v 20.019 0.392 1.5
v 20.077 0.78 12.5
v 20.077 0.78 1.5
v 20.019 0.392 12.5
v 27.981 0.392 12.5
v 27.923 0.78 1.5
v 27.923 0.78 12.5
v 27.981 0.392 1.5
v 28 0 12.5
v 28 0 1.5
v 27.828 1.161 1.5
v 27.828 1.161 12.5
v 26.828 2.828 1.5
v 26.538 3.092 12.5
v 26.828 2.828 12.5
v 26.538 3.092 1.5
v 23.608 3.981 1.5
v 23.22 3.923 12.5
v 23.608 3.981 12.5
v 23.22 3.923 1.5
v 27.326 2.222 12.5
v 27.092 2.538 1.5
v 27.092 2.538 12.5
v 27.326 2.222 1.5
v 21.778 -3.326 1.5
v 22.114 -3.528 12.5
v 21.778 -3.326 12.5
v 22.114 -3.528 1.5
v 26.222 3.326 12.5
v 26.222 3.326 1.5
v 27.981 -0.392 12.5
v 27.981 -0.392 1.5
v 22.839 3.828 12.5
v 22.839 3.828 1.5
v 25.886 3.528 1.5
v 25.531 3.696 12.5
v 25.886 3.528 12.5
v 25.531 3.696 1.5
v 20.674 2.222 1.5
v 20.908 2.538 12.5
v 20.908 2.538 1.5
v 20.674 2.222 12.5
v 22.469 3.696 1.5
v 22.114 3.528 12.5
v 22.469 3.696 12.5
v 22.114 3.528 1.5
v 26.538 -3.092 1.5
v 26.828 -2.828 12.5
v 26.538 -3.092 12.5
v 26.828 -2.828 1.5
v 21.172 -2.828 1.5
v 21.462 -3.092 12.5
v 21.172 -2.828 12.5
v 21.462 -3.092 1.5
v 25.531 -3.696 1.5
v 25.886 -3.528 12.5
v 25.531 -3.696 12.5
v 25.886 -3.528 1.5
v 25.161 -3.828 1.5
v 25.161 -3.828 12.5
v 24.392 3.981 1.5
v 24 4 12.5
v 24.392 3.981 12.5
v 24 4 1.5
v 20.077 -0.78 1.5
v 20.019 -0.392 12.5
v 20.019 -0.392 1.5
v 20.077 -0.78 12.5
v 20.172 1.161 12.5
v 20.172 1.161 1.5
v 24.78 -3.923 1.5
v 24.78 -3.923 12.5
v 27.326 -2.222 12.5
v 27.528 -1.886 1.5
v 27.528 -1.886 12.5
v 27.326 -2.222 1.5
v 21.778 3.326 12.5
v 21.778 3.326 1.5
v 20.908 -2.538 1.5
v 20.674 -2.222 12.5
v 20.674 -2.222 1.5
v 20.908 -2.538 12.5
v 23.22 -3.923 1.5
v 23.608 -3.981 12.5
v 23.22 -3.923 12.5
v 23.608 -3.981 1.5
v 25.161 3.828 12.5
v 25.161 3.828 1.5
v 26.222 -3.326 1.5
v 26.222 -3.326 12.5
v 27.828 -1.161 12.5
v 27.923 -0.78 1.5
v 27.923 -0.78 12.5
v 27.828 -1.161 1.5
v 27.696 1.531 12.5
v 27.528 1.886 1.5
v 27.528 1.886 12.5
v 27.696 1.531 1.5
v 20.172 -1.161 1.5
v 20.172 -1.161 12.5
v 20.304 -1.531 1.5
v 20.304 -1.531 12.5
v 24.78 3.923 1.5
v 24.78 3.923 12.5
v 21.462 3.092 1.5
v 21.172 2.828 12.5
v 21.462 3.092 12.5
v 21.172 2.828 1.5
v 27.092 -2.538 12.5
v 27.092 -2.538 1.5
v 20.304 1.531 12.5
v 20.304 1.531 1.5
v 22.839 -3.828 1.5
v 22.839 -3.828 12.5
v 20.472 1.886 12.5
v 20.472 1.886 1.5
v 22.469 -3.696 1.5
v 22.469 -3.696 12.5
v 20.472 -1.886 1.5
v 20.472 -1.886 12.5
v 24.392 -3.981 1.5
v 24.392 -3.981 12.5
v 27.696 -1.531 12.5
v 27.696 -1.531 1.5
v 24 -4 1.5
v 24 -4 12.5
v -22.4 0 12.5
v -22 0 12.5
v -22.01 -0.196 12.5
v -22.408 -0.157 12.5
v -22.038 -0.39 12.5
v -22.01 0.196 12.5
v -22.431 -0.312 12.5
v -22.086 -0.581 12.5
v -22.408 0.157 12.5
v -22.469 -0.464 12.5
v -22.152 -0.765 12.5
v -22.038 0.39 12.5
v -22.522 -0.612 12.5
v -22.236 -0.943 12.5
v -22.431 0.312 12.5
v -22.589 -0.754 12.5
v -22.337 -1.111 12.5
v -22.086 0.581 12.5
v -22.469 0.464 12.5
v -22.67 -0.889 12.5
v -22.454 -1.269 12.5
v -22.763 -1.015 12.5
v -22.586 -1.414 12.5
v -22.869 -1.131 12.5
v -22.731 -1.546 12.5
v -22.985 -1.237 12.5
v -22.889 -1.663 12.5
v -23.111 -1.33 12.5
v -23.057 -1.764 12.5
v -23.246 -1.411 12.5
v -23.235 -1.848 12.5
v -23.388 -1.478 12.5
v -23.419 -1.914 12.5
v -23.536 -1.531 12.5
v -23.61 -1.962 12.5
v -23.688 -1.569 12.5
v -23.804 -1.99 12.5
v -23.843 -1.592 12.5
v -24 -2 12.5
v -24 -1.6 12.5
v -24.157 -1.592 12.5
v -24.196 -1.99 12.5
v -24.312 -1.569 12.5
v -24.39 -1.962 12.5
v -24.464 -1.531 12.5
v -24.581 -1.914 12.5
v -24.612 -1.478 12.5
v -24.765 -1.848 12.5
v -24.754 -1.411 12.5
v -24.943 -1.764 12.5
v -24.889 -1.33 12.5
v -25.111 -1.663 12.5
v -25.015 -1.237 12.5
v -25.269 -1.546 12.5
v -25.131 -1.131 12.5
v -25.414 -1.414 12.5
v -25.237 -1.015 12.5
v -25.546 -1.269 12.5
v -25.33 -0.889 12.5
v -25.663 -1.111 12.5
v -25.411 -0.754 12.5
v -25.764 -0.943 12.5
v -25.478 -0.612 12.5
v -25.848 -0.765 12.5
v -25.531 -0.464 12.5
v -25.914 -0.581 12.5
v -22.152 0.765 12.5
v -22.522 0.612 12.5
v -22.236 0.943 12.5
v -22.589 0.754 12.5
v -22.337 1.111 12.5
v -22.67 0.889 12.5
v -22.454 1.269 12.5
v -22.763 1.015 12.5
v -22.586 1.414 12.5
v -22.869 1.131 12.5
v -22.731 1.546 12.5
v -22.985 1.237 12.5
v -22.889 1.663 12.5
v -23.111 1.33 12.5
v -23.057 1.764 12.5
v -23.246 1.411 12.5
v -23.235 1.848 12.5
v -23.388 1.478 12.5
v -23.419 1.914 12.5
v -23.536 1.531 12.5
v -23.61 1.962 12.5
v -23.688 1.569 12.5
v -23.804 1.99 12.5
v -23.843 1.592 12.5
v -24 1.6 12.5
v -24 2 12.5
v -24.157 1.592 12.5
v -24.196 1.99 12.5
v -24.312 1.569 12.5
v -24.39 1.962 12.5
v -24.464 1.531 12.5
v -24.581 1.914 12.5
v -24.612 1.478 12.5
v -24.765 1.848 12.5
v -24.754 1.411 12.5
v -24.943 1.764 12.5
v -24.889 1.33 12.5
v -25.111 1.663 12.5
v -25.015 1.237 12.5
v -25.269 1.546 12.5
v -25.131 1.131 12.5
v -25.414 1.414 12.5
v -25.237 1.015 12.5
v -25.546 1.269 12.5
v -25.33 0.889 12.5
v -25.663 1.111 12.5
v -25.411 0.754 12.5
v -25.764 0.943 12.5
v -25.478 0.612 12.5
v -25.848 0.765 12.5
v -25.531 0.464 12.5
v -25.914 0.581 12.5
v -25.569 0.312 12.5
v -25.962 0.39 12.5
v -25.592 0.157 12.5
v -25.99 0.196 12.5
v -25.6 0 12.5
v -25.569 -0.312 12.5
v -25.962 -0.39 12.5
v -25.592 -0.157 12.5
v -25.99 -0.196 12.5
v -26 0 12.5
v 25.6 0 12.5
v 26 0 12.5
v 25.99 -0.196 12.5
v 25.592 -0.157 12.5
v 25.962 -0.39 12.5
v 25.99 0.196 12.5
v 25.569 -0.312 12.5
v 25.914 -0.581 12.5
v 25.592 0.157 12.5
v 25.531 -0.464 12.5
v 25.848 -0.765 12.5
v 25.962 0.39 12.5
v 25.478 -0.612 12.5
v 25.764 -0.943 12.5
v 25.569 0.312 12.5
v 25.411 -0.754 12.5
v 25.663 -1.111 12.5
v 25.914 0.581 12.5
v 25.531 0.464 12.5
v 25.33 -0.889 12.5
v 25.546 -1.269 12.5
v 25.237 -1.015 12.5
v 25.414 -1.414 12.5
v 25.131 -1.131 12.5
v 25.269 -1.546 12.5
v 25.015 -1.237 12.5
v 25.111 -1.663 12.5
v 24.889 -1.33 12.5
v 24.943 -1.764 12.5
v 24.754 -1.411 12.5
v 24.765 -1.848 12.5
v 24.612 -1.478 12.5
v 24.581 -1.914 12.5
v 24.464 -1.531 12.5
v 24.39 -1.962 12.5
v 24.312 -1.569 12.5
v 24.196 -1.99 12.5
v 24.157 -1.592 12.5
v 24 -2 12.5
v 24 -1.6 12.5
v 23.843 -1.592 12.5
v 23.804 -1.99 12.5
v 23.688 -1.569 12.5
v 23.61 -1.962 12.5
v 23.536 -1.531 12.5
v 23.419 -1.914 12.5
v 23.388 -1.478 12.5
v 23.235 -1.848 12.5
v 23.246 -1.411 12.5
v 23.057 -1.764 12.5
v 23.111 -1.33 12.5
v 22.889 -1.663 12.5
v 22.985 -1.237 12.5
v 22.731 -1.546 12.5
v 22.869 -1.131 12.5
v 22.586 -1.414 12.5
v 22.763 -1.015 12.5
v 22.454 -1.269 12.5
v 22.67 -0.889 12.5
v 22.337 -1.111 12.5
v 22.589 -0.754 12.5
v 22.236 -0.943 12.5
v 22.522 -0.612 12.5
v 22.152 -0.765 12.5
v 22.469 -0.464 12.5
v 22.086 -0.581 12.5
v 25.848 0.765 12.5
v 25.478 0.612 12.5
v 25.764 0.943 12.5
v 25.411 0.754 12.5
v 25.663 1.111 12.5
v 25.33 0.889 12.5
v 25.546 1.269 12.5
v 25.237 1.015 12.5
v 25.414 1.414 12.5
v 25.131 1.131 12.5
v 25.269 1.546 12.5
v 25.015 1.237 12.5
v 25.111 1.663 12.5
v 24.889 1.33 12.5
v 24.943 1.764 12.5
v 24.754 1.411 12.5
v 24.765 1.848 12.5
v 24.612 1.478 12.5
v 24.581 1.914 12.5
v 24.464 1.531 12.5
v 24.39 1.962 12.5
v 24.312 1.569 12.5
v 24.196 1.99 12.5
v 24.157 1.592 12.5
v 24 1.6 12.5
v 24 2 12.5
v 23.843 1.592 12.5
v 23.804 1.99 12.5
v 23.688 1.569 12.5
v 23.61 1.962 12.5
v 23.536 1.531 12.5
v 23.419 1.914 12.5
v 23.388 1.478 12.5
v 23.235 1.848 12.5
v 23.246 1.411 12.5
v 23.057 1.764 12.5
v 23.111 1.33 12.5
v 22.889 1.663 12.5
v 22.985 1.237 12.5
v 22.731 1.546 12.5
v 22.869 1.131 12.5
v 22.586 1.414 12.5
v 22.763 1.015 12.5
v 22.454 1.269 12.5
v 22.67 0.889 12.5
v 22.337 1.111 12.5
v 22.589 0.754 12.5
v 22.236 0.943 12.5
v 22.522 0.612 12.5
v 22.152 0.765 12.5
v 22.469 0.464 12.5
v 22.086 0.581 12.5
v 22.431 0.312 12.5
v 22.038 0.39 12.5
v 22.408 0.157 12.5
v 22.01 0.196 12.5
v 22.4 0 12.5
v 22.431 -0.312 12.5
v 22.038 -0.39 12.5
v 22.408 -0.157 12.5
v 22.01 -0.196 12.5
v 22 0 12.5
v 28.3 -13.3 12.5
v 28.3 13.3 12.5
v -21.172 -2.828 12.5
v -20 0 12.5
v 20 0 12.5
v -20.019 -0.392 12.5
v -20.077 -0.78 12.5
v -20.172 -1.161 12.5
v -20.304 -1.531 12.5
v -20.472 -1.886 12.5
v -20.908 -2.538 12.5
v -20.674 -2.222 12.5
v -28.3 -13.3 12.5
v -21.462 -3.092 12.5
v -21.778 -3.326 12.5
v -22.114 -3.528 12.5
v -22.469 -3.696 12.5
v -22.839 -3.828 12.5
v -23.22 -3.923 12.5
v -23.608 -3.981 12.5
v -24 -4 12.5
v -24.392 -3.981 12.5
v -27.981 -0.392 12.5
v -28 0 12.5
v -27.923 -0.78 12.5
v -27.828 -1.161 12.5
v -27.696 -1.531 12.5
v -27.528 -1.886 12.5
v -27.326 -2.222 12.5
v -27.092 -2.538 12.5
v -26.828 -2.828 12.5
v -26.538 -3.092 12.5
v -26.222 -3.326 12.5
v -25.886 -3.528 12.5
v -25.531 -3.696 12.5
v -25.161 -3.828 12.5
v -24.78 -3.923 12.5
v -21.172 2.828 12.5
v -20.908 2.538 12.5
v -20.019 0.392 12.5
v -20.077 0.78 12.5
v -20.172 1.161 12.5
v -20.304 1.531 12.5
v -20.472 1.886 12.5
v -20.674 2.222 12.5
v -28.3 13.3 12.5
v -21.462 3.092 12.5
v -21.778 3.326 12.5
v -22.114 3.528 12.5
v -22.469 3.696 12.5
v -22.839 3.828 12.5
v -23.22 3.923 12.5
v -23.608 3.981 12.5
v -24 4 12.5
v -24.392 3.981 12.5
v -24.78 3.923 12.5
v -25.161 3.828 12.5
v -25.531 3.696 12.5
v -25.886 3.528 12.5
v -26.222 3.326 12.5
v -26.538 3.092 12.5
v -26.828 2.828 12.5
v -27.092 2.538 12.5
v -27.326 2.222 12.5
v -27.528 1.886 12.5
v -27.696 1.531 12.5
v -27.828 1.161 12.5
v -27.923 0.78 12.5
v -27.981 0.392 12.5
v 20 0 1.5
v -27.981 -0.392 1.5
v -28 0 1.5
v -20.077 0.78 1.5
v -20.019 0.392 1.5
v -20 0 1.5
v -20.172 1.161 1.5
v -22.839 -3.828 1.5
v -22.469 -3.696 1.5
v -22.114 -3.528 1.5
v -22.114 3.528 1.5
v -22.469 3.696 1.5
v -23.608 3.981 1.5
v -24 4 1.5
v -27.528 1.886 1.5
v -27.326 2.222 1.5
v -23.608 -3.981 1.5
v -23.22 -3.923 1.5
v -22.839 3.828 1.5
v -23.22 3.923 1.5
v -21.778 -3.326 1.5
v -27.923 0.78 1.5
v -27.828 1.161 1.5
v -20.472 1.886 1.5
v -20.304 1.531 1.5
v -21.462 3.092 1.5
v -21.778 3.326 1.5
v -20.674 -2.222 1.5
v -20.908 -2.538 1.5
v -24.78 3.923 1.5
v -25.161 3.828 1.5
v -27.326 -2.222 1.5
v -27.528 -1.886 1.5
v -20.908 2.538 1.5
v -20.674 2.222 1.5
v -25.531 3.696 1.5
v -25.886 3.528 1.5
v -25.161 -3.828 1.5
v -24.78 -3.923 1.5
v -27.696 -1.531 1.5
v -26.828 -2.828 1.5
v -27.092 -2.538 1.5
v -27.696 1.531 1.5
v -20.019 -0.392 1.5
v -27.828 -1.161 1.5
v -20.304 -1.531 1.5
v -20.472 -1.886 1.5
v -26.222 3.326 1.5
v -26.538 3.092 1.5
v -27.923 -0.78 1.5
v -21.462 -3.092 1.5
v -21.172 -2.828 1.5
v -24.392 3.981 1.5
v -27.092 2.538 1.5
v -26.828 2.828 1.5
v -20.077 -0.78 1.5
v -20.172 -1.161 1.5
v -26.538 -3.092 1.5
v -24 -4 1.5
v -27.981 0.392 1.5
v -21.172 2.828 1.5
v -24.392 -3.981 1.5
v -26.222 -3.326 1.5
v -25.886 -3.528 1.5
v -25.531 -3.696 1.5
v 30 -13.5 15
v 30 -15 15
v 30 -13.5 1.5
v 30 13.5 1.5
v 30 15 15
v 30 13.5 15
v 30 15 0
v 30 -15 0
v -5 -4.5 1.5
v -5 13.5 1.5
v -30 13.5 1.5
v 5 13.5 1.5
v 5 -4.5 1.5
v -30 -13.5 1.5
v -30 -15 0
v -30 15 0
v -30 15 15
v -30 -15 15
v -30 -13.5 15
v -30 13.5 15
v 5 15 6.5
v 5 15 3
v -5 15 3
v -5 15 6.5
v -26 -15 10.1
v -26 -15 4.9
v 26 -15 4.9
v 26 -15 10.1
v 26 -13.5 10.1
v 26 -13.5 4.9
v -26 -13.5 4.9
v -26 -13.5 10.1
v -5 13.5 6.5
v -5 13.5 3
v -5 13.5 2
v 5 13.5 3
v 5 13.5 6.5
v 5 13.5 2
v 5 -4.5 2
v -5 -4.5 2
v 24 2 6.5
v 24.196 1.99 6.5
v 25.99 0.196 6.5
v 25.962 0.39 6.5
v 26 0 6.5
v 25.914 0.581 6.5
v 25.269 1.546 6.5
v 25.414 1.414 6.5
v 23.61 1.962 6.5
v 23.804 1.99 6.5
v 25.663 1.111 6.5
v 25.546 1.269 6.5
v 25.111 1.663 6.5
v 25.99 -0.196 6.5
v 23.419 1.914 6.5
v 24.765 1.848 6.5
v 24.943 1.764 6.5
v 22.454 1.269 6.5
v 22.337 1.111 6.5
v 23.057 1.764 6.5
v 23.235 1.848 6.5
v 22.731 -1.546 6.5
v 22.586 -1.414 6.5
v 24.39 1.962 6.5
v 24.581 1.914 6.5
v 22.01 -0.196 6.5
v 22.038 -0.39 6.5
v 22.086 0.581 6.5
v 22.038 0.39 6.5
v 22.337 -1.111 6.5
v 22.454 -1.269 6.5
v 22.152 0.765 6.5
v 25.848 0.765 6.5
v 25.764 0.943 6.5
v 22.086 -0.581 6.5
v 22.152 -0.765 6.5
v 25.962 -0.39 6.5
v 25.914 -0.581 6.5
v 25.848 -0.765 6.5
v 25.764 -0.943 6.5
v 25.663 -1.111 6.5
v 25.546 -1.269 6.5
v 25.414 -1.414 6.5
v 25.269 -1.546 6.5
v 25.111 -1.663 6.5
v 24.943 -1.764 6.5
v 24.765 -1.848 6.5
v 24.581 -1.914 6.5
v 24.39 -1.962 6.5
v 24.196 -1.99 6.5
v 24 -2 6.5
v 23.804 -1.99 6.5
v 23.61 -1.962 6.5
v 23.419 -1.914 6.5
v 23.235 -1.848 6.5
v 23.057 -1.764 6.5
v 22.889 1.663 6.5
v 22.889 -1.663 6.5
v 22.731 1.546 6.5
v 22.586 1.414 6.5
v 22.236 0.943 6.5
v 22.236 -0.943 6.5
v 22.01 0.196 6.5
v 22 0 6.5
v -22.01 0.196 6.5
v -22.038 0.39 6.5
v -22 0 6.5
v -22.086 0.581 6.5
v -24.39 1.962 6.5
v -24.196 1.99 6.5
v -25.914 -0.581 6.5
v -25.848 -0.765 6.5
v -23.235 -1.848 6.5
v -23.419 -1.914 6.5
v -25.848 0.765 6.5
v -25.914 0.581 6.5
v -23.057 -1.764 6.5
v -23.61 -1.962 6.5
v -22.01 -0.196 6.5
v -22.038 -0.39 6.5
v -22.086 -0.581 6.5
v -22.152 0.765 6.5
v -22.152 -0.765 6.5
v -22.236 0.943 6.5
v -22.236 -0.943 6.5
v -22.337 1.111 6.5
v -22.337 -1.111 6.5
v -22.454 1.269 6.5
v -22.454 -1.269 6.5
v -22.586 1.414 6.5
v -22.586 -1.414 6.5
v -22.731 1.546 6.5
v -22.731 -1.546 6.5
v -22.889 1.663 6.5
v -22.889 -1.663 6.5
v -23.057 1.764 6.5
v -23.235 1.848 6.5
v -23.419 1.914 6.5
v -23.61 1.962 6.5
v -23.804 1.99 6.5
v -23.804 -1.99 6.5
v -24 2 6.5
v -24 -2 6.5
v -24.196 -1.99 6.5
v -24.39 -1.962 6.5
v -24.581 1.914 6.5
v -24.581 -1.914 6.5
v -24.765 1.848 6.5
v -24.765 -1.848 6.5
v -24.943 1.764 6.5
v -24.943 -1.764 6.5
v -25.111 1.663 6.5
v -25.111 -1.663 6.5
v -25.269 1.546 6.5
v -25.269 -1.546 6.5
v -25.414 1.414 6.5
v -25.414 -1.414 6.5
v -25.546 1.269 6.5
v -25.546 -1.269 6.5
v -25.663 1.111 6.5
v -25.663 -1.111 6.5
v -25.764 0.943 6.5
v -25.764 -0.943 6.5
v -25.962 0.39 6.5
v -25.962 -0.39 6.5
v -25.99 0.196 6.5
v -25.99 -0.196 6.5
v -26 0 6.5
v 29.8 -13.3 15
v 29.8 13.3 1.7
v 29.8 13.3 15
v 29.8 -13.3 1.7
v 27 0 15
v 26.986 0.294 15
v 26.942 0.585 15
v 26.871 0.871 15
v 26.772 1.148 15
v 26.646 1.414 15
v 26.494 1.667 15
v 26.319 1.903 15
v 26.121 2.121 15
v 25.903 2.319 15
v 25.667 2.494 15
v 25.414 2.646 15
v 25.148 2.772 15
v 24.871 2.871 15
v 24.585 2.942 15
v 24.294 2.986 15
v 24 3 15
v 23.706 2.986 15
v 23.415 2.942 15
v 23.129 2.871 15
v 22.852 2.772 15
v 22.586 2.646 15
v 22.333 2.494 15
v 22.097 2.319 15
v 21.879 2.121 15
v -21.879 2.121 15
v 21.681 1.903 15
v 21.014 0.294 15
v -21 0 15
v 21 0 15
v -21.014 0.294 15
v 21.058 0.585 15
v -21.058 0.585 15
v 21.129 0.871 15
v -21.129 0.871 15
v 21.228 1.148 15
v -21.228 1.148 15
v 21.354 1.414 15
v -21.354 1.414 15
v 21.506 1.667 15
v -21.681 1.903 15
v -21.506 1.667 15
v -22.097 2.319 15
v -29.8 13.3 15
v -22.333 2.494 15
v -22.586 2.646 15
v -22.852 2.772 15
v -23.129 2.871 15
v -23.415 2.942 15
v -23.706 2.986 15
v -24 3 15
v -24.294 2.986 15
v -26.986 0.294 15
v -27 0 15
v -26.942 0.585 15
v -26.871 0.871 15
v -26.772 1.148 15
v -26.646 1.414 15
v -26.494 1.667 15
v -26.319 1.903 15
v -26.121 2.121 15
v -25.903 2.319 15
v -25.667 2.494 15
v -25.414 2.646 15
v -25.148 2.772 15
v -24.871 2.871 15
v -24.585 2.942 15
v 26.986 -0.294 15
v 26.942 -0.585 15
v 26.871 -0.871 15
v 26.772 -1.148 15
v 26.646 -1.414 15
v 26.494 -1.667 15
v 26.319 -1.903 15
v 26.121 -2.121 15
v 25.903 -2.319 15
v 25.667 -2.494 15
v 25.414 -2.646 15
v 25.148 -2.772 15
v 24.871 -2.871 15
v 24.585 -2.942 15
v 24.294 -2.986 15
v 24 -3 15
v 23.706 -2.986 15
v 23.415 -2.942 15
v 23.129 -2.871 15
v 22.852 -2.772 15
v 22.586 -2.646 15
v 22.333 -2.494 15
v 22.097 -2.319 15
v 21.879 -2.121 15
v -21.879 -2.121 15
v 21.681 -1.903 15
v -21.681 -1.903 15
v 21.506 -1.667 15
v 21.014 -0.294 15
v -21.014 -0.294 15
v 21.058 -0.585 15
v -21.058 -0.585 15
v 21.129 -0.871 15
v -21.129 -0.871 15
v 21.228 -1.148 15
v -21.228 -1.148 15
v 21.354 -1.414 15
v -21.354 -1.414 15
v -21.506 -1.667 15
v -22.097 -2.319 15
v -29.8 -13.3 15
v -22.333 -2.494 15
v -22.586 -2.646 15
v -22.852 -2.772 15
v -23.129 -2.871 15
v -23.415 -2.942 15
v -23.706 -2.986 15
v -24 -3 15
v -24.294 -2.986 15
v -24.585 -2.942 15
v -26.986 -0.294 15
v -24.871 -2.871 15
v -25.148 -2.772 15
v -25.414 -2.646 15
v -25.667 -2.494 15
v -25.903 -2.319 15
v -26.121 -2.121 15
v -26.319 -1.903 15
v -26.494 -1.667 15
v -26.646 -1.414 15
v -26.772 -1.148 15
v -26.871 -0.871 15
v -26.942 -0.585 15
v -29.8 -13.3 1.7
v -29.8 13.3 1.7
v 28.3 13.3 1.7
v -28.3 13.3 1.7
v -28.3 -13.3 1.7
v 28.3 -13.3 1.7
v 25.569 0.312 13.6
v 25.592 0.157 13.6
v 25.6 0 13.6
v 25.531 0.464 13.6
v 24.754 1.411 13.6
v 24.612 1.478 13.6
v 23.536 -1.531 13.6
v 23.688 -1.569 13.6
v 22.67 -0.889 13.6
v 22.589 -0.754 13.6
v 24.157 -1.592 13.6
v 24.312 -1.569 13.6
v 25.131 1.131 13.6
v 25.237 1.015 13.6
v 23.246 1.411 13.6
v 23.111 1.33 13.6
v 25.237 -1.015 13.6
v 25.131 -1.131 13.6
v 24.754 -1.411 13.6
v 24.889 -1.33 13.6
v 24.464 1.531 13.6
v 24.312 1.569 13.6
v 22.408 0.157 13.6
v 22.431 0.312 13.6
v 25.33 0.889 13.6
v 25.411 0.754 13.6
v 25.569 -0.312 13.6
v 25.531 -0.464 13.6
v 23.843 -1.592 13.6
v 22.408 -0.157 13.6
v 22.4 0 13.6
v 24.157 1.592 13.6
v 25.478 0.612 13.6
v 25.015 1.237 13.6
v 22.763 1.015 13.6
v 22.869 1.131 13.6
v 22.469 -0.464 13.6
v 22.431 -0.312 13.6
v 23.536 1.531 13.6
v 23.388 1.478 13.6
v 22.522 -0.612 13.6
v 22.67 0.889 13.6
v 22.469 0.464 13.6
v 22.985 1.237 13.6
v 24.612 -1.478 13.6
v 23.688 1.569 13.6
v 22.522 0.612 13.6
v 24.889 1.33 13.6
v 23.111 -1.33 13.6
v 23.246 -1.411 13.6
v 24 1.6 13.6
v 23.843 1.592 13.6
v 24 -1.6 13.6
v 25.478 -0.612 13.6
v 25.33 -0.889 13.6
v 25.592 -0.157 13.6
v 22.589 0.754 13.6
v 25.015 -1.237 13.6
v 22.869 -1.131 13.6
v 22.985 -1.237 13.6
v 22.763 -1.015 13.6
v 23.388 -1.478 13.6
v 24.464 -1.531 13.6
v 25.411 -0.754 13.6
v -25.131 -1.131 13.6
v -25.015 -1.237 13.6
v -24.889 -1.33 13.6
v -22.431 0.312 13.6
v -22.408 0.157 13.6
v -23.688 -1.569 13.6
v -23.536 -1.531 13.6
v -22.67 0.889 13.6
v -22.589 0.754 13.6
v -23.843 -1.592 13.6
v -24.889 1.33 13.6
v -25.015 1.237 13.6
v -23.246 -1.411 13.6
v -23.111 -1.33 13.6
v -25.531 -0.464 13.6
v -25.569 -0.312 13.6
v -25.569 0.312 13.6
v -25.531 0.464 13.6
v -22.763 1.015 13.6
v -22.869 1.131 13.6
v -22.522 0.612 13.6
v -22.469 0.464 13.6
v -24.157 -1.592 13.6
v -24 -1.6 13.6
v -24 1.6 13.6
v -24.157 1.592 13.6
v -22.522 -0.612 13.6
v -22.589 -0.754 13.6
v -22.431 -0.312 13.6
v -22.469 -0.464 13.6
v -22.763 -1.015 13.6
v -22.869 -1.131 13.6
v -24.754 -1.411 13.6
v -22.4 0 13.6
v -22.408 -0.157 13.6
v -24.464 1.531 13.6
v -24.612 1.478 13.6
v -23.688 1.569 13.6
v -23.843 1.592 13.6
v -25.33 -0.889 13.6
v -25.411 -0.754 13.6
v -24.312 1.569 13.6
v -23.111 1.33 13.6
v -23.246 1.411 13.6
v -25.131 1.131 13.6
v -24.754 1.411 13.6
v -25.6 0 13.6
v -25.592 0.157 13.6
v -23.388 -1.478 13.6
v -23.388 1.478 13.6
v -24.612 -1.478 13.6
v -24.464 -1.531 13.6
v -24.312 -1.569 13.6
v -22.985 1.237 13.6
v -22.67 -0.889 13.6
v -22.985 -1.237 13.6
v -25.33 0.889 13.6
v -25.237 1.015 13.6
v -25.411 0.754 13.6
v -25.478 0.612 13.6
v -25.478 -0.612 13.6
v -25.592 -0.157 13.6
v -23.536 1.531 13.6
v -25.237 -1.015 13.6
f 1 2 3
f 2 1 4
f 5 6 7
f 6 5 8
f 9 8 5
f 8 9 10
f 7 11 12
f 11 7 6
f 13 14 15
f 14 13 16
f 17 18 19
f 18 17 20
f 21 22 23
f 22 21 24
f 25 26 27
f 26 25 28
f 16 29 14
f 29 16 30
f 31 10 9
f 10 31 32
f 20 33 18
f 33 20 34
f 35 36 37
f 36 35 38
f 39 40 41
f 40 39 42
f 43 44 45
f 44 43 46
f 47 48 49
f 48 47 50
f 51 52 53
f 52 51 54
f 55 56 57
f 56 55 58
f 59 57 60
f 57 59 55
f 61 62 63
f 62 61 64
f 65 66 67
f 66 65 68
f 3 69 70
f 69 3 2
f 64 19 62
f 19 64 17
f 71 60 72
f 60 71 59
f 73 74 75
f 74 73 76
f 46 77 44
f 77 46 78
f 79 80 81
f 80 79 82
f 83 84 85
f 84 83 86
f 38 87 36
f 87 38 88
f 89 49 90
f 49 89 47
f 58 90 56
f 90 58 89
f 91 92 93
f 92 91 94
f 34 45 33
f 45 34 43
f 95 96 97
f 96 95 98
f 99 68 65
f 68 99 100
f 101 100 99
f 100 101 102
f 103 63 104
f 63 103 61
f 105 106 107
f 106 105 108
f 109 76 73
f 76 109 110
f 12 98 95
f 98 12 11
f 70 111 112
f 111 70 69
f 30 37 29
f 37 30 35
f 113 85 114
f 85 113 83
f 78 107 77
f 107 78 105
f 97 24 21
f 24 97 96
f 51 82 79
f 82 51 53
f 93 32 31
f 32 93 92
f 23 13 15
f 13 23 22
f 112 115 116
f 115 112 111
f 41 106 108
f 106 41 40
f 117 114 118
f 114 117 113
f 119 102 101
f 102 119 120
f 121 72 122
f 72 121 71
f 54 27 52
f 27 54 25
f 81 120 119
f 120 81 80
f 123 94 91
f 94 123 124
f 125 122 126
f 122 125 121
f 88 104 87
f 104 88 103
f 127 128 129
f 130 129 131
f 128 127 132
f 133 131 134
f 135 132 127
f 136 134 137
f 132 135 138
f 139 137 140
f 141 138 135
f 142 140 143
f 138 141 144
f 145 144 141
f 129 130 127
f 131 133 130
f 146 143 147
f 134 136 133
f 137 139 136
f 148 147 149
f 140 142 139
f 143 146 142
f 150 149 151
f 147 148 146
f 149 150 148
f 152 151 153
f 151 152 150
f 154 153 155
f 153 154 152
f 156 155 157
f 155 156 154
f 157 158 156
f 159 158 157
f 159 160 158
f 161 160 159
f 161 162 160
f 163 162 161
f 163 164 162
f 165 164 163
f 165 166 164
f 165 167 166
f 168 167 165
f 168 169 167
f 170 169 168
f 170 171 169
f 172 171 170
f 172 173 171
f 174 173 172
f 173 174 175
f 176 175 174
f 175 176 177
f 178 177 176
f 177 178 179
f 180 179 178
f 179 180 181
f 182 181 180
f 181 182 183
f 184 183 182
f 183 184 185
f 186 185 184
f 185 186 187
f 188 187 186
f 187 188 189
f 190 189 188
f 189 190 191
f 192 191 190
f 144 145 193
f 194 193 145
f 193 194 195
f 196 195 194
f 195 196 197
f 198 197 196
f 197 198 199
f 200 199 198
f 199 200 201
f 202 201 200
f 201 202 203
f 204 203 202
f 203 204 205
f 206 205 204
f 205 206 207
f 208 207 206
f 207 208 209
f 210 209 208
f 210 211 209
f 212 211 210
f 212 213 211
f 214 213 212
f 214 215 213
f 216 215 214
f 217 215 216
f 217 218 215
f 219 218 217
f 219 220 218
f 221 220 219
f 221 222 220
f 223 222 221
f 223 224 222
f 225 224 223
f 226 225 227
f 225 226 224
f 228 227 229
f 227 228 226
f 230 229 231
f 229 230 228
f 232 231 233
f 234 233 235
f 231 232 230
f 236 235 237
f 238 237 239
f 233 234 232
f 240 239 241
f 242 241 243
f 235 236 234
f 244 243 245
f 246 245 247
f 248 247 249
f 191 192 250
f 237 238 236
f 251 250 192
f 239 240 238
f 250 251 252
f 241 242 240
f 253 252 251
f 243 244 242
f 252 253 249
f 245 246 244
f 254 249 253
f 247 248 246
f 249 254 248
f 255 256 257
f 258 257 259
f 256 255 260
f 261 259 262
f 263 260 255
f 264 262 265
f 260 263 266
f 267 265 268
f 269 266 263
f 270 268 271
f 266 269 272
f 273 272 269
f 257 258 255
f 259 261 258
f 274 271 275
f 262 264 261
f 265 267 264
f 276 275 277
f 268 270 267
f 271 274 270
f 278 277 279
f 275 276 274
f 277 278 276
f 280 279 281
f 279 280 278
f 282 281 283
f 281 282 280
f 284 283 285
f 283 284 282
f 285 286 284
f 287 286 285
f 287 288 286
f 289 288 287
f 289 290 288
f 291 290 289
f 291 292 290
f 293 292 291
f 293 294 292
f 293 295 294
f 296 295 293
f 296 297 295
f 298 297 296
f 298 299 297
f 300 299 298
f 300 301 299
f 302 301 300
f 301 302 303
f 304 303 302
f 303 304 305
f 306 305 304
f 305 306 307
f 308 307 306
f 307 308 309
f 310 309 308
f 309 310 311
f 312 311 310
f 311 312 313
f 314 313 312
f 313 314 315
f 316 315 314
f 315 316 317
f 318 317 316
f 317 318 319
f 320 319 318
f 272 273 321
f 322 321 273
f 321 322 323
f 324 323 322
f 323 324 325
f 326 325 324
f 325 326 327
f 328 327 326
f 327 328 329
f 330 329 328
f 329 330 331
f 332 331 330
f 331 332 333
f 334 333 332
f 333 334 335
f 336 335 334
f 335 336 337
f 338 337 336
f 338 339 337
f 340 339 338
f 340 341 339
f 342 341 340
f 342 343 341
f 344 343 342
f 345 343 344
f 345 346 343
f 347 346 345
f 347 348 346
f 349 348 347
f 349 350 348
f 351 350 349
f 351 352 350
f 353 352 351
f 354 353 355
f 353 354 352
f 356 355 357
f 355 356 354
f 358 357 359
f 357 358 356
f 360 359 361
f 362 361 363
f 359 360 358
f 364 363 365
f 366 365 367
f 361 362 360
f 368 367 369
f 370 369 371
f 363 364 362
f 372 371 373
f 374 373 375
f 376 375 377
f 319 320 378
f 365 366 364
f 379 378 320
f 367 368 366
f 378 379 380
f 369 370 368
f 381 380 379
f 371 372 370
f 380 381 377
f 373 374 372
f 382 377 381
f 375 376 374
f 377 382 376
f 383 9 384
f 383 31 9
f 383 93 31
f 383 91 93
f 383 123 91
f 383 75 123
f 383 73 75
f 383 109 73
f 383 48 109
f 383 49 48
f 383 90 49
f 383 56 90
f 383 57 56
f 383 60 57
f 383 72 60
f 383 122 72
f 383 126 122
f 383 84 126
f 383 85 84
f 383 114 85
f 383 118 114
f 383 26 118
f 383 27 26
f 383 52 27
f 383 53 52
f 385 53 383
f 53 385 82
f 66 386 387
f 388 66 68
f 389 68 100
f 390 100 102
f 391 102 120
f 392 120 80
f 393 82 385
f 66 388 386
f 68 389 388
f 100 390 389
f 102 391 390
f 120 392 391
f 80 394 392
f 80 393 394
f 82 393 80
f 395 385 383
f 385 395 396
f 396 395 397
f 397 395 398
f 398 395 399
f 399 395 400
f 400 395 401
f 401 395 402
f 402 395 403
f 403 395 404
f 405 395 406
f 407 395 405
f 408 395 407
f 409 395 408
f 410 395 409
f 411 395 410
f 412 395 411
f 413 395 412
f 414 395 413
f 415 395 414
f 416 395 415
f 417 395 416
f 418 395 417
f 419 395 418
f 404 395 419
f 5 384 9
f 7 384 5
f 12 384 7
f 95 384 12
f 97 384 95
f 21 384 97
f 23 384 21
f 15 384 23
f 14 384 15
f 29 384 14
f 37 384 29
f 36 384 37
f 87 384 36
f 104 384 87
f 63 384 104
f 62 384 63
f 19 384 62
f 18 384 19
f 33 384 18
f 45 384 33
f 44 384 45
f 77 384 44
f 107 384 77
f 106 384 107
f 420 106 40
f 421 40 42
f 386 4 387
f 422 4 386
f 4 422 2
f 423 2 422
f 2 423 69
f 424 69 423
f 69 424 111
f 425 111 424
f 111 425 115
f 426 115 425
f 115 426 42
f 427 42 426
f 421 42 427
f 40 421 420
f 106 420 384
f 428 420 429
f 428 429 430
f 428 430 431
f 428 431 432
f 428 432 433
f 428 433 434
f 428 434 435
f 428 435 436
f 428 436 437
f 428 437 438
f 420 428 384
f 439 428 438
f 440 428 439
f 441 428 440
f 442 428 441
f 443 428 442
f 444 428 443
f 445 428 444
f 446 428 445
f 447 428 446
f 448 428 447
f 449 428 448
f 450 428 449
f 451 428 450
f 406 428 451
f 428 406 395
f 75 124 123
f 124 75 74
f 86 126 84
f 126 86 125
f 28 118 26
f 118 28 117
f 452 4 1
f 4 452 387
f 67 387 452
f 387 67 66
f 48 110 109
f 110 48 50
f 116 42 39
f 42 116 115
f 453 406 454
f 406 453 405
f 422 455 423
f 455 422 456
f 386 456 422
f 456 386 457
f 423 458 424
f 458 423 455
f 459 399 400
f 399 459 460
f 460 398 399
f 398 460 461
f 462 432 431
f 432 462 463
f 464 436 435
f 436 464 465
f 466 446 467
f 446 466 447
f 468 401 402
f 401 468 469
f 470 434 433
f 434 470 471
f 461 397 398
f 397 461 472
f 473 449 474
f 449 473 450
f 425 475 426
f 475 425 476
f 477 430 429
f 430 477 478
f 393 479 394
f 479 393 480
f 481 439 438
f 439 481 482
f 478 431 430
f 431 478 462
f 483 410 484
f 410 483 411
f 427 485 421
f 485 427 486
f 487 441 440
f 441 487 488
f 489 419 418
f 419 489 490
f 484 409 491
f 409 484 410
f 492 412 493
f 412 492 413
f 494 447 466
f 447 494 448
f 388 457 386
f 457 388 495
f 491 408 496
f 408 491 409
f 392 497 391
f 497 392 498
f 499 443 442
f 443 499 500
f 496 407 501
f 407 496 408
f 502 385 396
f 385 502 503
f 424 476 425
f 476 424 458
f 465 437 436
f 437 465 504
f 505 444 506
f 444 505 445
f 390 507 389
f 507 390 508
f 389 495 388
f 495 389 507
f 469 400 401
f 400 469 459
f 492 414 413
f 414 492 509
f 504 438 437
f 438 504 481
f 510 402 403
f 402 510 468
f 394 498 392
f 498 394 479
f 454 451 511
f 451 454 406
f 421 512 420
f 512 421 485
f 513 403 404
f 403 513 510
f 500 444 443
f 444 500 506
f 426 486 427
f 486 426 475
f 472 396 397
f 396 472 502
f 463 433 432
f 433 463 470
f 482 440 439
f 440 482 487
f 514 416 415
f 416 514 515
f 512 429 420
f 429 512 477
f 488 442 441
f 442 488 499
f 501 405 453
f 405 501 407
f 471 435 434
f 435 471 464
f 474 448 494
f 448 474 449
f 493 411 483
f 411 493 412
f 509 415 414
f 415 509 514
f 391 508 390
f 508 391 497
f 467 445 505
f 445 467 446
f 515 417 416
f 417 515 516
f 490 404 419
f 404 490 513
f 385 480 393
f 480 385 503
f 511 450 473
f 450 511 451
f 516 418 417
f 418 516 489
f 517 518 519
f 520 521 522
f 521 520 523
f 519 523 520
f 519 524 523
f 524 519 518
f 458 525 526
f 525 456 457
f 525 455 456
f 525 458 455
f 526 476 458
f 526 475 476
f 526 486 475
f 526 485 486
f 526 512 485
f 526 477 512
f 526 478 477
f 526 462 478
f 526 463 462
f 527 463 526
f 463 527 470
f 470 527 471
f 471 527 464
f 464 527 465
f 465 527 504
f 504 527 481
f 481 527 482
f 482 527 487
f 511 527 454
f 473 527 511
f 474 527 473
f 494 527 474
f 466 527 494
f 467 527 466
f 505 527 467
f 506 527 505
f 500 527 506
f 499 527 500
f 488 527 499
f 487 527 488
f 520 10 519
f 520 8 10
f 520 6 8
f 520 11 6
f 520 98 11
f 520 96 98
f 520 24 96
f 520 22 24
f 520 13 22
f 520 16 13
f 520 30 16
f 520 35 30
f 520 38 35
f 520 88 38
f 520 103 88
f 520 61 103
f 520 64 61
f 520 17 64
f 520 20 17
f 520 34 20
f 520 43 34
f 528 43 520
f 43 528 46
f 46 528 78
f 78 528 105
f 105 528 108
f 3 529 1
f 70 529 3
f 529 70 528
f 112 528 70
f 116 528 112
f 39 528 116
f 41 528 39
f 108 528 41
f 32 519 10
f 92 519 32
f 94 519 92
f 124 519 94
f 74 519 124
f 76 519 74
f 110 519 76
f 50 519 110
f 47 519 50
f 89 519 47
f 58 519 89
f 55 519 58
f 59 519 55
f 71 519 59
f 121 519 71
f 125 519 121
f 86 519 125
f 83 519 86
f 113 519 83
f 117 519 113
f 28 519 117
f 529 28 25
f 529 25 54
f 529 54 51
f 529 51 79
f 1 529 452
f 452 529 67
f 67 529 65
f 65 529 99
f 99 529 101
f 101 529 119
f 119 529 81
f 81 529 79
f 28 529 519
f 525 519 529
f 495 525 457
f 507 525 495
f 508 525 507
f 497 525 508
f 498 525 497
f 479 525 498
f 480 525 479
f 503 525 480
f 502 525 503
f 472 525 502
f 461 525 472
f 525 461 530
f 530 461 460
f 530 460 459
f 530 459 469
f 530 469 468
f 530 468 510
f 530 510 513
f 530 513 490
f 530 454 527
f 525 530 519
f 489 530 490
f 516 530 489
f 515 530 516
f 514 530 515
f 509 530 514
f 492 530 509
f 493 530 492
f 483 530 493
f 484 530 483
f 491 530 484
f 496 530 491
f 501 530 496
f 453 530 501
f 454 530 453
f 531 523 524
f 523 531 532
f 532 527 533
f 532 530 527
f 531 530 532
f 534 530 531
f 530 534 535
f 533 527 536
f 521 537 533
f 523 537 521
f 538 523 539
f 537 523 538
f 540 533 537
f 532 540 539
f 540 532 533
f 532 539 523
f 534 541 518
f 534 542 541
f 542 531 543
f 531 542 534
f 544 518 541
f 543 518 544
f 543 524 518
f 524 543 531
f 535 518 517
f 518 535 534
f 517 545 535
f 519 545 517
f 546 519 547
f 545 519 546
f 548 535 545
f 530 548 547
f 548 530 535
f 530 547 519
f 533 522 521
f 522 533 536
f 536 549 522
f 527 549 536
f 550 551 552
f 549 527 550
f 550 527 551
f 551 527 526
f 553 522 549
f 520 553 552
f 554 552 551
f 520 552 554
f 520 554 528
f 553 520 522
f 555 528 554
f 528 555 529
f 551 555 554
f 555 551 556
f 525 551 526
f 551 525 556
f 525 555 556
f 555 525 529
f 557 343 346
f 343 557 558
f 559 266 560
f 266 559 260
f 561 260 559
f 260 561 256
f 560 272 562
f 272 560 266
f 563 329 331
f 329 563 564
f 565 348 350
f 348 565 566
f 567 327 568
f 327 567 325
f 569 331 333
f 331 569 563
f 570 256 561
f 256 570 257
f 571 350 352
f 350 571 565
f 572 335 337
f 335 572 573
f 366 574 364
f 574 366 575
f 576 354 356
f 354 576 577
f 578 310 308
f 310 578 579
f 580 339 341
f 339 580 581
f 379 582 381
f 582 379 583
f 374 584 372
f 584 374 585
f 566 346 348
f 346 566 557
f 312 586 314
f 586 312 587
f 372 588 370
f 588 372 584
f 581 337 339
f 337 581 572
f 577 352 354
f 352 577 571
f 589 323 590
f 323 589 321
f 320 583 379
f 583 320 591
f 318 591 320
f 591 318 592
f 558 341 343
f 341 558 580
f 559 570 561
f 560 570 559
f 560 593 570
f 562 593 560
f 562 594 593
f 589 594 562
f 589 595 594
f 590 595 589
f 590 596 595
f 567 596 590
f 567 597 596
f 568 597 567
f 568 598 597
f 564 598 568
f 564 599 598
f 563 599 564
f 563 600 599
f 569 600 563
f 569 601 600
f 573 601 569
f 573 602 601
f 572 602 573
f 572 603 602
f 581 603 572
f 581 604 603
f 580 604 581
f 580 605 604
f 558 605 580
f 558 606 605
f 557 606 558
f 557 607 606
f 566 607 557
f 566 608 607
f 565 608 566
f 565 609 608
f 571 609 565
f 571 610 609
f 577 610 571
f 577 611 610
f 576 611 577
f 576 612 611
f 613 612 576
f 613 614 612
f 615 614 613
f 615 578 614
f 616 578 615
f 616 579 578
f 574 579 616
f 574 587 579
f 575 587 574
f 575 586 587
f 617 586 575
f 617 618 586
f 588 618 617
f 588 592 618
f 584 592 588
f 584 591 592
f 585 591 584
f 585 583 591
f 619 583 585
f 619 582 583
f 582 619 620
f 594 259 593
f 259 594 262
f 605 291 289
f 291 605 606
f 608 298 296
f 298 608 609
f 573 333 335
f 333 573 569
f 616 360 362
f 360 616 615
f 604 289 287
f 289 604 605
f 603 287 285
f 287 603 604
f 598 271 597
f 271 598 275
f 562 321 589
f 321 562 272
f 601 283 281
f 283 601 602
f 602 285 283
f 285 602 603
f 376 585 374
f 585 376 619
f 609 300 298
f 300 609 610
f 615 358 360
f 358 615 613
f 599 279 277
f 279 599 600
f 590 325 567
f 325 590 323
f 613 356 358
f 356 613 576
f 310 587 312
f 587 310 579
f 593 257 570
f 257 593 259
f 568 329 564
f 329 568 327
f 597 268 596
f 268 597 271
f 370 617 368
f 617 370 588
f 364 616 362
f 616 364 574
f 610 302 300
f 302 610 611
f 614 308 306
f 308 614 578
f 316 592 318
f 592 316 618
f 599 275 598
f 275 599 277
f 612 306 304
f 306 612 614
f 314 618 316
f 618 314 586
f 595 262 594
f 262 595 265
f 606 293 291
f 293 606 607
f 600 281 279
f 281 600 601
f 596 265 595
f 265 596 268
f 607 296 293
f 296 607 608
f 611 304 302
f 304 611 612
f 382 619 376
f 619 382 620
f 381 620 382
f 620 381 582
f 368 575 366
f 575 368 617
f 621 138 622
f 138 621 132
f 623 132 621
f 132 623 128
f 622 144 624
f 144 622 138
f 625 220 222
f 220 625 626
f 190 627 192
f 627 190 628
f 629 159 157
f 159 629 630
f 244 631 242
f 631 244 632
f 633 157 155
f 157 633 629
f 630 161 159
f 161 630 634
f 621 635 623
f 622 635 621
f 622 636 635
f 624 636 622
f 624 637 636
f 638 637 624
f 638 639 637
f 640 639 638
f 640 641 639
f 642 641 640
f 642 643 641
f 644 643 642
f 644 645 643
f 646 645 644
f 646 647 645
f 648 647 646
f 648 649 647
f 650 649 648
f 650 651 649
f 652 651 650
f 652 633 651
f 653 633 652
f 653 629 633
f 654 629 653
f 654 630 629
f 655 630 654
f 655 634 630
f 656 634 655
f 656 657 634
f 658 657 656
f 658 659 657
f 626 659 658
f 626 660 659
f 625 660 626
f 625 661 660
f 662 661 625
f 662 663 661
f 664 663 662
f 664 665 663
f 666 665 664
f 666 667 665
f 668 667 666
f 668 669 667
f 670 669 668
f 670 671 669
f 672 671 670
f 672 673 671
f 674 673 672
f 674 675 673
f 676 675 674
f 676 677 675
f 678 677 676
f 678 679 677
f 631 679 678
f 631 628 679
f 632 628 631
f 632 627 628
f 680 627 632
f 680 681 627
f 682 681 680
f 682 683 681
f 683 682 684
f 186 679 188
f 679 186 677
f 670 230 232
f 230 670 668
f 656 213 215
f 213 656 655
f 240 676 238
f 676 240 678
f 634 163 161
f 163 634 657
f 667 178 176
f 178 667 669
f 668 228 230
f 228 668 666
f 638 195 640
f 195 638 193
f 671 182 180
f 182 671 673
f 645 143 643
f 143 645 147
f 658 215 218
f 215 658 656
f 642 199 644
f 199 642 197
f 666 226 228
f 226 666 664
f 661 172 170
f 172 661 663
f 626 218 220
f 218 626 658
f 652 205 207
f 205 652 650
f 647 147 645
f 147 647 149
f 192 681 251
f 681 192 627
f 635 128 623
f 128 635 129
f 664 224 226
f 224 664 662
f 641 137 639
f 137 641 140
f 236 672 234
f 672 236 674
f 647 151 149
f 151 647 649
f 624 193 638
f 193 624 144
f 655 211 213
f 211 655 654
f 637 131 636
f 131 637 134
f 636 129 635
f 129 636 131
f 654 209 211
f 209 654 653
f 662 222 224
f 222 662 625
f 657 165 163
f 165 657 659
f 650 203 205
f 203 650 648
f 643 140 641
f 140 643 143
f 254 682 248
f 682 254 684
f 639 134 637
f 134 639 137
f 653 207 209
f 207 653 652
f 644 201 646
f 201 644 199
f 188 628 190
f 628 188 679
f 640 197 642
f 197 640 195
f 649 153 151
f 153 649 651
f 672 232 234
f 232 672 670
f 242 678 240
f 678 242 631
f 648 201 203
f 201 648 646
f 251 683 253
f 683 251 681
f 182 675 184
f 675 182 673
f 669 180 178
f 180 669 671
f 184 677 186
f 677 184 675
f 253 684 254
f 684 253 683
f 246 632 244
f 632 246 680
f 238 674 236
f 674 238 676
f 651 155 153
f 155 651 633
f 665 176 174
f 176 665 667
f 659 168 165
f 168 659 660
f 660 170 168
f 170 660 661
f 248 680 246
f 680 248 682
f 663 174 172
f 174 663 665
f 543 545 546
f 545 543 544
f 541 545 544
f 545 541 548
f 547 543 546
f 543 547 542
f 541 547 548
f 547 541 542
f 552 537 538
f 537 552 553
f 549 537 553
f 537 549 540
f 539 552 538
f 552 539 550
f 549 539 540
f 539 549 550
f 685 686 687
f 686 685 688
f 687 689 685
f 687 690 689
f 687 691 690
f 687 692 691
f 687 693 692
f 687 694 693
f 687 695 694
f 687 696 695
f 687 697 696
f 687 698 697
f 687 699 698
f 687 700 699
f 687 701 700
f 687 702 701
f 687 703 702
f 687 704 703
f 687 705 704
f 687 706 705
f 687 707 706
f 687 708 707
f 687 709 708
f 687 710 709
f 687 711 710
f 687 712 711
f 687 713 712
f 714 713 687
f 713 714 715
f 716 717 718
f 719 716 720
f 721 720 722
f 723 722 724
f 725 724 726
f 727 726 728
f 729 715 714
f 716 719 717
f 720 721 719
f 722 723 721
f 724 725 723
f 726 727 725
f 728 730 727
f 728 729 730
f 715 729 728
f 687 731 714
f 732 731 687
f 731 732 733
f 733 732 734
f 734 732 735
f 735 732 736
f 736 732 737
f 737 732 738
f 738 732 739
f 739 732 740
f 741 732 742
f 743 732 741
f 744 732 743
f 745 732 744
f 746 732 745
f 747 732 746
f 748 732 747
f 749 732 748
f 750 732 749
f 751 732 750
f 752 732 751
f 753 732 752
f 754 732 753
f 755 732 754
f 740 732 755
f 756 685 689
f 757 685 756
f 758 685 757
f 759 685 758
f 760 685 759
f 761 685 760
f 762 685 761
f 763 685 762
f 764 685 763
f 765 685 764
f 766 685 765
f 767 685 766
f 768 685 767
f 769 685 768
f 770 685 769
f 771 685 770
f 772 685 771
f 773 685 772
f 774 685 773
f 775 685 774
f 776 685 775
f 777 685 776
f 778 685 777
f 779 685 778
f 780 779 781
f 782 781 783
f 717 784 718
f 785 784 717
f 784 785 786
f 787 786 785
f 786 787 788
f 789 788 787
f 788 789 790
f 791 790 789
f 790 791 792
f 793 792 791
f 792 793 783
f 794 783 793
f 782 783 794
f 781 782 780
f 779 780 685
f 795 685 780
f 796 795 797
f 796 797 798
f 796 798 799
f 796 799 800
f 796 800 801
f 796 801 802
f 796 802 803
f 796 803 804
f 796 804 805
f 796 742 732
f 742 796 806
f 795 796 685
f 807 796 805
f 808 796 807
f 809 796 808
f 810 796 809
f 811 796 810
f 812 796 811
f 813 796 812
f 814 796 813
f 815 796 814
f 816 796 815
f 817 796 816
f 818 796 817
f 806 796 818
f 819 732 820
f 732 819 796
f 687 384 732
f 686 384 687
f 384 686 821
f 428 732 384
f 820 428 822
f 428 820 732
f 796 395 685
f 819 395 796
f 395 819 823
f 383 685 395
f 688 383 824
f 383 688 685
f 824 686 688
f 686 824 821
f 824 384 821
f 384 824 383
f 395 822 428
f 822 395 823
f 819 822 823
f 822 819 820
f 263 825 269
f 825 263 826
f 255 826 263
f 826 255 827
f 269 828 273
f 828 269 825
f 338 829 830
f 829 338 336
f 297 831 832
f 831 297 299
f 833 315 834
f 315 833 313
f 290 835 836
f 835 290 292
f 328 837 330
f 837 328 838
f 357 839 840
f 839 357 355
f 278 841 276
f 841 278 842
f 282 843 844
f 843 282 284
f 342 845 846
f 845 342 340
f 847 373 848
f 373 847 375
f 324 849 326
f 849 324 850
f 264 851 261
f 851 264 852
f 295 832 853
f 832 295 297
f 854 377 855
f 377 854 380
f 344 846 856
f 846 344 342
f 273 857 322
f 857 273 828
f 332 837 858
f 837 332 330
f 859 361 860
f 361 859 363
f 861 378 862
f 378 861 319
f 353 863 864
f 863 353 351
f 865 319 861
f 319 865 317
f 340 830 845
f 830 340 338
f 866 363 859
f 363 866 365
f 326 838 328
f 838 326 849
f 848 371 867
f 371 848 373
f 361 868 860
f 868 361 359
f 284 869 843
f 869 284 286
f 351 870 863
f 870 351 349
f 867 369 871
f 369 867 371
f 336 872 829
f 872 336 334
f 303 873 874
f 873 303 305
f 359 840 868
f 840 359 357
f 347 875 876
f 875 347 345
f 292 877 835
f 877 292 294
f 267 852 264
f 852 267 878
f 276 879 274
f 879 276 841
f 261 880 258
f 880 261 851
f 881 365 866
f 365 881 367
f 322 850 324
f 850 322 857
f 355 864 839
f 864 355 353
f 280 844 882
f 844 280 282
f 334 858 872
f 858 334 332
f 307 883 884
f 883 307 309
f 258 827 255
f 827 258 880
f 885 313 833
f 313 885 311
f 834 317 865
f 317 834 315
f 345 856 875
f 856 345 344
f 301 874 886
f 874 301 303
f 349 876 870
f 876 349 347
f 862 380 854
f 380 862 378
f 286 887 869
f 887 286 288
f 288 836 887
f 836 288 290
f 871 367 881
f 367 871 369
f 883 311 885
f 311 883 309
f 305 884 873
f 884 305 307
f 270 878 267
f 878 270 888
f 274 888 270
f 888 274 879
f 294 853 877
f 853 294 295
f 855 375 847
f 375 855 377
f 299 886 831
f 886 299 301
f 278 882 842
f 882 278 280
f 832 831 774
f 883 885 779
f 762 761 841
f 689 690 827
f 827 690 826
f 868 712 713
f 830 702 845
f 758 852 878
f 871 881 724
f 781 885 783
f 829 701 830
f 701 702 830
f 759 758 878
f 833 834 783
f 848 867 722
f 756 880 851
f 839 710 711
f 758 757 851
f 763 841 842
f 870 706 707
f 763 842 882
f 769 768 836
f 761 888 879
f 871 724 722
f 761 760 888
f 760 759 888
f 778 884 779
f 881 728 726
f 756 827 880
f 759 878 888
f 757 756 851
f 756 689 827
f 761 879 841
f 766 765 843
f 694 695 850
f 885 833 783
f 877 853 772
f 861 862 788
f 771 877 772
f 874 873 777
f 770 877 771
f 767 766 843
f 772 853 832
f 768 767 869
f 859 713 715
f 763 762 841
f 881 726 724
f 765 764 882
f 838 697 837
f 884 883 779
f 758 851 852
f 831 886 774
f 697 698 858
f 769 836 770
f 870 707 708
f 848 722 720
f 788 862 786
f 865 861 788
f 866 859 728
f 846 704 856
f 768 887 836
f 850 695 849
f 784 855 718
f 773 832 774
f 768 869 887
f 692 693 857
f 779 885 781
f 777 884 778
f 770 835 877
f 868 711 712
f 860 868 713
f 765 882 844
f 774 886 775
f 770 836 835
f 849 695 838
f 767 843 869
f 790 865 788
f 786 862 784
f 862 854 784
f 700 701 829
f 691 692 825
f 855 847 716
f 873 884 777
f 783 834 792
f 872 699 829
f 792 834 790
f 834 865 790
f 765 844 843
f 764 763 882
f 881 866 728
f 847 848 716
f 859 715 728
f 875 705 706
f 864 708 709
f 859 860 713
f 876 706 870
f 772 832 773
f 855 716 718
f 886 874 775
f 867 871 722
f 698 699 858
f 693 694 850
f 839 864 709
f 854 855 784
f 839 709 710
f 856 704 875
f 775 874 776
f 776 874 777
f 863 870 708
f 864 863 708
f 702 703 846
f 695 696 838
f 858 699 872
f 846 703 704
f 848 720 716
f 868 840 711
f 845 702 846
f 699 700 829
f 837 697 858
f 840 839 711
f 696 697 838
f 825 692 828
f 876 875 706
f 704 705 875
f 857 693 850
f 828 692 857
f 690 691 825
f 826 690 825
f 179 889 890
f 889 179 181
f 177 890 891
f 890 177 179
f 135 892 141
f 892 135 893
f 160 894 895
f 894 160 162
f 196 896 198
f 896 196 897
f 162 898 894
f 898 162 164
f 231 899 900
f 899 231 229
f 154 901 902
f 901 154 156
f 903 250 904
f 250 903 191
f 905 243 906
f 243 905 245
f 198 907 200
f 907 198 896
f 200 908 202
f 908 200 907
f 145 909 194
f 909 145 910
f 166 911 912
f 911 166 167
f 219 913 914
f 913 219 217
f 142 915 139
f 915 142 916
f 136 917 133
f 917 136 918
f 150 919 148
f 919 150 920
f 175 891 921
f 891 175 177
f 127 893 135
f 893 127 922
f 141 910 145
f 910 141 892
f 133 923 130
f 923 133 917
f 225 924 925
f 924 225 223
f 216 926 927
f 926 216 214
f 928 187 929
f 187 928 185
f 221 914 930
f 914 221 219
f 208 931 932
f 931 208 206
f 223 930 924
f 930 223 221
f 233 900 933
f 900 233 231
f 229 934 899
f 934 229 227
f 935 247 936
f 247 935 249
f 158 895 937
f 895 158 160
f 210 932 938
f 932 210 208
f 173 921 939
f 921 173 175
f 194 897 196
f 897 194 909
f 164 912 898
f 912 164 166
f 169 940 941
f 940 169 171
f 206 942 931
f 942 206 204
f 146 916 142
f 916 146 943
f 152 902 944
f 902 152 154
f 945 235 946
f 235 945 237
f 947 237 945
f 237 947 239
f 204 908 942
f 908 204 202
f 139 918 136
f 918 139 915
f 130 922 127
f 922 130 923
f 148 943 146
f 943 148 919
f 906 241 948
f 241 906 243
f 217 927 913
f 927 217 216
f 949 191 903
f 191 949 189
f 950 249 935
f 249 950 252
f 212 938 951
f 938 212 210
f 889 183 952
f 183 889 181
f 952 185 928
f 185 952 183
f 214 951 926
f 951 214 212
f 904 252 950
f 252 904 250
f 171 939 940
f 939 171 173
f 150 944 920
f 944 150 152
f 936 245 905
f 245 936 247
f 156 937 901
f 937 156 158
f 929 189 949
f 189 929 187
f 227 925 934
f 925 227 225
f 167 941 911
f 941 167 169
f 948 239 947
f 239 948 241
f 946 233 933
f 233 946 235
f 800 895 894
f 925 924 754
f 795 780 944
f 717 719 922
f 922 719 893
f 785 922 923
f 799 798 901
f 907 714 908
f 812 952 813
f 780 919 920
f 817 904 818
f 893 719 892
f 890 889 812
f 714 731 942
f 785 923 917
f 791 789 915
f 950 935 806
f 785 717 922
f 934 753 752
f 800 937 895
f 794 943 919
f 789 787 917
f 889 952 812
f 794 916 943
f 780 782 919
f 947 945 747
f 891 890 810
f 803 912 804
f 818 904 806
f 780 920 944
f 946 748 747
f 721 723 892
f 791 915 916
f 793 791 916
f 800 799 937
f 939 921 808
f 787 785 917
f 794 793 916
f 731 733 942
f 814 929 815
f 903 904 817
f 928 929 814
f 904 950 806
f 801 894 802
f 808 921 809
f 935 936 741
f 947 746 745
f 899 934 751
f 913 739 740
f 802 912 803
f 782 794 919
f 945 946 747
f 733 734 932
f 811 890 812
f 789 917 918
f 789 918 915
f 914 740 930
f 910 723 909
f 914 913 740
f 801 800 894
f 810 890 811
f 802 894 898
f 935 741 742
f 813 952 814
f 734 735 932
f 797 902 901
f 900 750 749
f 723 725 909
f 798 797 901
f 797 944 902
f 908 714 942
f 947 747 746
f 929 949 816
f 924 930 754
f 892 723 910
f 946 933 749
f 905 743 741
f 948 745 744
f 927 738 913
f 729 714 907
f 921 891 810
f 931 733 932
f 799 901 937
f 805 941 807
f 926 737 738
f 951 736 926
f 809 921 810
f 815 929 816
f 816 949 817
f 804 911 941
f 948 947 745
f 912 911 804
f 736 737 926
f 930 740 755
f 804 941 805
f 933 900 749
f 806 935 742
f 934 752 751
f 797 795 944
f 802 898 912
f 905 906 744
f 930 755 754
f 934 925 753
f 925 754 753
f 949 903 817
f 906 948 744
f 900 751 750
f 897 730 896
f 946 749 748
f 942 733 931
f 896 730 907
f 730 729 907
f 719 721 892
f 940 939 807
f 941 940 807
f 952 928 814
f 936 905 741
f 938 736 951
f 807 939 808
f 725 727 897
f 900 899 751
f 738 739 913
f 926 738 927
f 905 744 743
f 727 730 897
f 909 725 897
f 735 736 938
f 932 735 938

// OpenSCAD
// v4 CLOSED : floor pad only 2/3 of inner depth (from back wall)
W=60; D=30; H=15; T=1.5; CLR=0.2;
LID_TOP=2.5; BOX_H=H-LID_TOP; LID_X1=W/2-CLR; LID_PX0=LID_X1-T; LID_Y=D/2-T-CLR; LID_Z0=T+CLR;
HOLE_W=52; HOLE_H=5.2; HOLE_ZC=7.5;
BH_W=10; BH_H=3.5; BH_GAP=1.5;
PAD_X=10; PAD_Z=0.5; PAD_FRAC=2.0/3.0; PAD_Y=(D-2*T)*PAD_FRAC; PAD_YB=D/2-T;
SINK=1.0; CUT_BACK=1.0;
BOSS_R=4.0; INS_R=2.0; INS_DEPTH=6.0;
SCREW_R=1.6; CSK_R=3.0; CSK_H=CSK_R-SCREW_R; BOSS_X=LID_PX0-BOSS_R-0.3; BOSS_Y=0;
EXPLODE=0; $fn=64;
module box_body(){ difference(){ union(){
  translate([-W/2,-D/2,0]) cube([W,D,T]);
  translate([-W/2,-D/2,T]) cube([W,T,H-T]);
  translate([-W/2,D/2-T,T]) cube([W,T,H-T]);
  translate([-PAD_X/2,PAD_YB-PAD_Y,T-SINK]) cube([PAD_X,PAD_Y,PAD_Z+SINK]);
  for (sx=[1,-1]) translate([sx*BOSS_X,BOSS_Y,T-SINK]) cylinder(r=BOSS_R,h=BOX_H-T+SINK);
 } translate([-HOLE_W/2,-D/2-CUT_BACK,HOLE_ZC-HOLE_H/2]) cube([HOLE_W,T+2*CUT_BACK,HOLE_H]);
   translate([-BH_W/2,D/2-T-CUT_BACK,T+BH_GAP]) cube([BH_W,T+2*CUT_BACK,BH_H]);
   for (sx=[1,-1]) translate([sx*BOSS_X,BOSS_Y,BOX_H-INS_DEPTH]) cylinder(r=INS_R,h=INS_DEPTH+1); } }
module lid(){ difference(){ union(){
  translate([-LID_X1,-LID_Y,BOX_H]) cube([2*LID_X1,2*LID_Y,LID_TOP]);
  translate([LID_PX0,-LID_Y,LID_Z0]) cube([T,2*LID_Y,H-LID_Z0]);
  translate([-LID_X1,-LID_Y,LID_Z0]) cube([T,2*LID_Y,H-LID_Z0]);
 } for (sx=[1,-1]) translate([sx*BOSS_X,BOSS_Y,0]) {
     cylinder(r=SCREW_R,h=H+1);
     translate([0,0,H-CSK_H]) cylinder(r1=SCREW_R,r2=CSK_R,h=CSK_H);
     translate([0,0,H]) cylinder(r=CSK_R,h=1); } } }
color([0.55,0.78,0.95]) box_body();
translate([0,0,EXPLODE]) color([1.00,0.72,0.72]) lid();
